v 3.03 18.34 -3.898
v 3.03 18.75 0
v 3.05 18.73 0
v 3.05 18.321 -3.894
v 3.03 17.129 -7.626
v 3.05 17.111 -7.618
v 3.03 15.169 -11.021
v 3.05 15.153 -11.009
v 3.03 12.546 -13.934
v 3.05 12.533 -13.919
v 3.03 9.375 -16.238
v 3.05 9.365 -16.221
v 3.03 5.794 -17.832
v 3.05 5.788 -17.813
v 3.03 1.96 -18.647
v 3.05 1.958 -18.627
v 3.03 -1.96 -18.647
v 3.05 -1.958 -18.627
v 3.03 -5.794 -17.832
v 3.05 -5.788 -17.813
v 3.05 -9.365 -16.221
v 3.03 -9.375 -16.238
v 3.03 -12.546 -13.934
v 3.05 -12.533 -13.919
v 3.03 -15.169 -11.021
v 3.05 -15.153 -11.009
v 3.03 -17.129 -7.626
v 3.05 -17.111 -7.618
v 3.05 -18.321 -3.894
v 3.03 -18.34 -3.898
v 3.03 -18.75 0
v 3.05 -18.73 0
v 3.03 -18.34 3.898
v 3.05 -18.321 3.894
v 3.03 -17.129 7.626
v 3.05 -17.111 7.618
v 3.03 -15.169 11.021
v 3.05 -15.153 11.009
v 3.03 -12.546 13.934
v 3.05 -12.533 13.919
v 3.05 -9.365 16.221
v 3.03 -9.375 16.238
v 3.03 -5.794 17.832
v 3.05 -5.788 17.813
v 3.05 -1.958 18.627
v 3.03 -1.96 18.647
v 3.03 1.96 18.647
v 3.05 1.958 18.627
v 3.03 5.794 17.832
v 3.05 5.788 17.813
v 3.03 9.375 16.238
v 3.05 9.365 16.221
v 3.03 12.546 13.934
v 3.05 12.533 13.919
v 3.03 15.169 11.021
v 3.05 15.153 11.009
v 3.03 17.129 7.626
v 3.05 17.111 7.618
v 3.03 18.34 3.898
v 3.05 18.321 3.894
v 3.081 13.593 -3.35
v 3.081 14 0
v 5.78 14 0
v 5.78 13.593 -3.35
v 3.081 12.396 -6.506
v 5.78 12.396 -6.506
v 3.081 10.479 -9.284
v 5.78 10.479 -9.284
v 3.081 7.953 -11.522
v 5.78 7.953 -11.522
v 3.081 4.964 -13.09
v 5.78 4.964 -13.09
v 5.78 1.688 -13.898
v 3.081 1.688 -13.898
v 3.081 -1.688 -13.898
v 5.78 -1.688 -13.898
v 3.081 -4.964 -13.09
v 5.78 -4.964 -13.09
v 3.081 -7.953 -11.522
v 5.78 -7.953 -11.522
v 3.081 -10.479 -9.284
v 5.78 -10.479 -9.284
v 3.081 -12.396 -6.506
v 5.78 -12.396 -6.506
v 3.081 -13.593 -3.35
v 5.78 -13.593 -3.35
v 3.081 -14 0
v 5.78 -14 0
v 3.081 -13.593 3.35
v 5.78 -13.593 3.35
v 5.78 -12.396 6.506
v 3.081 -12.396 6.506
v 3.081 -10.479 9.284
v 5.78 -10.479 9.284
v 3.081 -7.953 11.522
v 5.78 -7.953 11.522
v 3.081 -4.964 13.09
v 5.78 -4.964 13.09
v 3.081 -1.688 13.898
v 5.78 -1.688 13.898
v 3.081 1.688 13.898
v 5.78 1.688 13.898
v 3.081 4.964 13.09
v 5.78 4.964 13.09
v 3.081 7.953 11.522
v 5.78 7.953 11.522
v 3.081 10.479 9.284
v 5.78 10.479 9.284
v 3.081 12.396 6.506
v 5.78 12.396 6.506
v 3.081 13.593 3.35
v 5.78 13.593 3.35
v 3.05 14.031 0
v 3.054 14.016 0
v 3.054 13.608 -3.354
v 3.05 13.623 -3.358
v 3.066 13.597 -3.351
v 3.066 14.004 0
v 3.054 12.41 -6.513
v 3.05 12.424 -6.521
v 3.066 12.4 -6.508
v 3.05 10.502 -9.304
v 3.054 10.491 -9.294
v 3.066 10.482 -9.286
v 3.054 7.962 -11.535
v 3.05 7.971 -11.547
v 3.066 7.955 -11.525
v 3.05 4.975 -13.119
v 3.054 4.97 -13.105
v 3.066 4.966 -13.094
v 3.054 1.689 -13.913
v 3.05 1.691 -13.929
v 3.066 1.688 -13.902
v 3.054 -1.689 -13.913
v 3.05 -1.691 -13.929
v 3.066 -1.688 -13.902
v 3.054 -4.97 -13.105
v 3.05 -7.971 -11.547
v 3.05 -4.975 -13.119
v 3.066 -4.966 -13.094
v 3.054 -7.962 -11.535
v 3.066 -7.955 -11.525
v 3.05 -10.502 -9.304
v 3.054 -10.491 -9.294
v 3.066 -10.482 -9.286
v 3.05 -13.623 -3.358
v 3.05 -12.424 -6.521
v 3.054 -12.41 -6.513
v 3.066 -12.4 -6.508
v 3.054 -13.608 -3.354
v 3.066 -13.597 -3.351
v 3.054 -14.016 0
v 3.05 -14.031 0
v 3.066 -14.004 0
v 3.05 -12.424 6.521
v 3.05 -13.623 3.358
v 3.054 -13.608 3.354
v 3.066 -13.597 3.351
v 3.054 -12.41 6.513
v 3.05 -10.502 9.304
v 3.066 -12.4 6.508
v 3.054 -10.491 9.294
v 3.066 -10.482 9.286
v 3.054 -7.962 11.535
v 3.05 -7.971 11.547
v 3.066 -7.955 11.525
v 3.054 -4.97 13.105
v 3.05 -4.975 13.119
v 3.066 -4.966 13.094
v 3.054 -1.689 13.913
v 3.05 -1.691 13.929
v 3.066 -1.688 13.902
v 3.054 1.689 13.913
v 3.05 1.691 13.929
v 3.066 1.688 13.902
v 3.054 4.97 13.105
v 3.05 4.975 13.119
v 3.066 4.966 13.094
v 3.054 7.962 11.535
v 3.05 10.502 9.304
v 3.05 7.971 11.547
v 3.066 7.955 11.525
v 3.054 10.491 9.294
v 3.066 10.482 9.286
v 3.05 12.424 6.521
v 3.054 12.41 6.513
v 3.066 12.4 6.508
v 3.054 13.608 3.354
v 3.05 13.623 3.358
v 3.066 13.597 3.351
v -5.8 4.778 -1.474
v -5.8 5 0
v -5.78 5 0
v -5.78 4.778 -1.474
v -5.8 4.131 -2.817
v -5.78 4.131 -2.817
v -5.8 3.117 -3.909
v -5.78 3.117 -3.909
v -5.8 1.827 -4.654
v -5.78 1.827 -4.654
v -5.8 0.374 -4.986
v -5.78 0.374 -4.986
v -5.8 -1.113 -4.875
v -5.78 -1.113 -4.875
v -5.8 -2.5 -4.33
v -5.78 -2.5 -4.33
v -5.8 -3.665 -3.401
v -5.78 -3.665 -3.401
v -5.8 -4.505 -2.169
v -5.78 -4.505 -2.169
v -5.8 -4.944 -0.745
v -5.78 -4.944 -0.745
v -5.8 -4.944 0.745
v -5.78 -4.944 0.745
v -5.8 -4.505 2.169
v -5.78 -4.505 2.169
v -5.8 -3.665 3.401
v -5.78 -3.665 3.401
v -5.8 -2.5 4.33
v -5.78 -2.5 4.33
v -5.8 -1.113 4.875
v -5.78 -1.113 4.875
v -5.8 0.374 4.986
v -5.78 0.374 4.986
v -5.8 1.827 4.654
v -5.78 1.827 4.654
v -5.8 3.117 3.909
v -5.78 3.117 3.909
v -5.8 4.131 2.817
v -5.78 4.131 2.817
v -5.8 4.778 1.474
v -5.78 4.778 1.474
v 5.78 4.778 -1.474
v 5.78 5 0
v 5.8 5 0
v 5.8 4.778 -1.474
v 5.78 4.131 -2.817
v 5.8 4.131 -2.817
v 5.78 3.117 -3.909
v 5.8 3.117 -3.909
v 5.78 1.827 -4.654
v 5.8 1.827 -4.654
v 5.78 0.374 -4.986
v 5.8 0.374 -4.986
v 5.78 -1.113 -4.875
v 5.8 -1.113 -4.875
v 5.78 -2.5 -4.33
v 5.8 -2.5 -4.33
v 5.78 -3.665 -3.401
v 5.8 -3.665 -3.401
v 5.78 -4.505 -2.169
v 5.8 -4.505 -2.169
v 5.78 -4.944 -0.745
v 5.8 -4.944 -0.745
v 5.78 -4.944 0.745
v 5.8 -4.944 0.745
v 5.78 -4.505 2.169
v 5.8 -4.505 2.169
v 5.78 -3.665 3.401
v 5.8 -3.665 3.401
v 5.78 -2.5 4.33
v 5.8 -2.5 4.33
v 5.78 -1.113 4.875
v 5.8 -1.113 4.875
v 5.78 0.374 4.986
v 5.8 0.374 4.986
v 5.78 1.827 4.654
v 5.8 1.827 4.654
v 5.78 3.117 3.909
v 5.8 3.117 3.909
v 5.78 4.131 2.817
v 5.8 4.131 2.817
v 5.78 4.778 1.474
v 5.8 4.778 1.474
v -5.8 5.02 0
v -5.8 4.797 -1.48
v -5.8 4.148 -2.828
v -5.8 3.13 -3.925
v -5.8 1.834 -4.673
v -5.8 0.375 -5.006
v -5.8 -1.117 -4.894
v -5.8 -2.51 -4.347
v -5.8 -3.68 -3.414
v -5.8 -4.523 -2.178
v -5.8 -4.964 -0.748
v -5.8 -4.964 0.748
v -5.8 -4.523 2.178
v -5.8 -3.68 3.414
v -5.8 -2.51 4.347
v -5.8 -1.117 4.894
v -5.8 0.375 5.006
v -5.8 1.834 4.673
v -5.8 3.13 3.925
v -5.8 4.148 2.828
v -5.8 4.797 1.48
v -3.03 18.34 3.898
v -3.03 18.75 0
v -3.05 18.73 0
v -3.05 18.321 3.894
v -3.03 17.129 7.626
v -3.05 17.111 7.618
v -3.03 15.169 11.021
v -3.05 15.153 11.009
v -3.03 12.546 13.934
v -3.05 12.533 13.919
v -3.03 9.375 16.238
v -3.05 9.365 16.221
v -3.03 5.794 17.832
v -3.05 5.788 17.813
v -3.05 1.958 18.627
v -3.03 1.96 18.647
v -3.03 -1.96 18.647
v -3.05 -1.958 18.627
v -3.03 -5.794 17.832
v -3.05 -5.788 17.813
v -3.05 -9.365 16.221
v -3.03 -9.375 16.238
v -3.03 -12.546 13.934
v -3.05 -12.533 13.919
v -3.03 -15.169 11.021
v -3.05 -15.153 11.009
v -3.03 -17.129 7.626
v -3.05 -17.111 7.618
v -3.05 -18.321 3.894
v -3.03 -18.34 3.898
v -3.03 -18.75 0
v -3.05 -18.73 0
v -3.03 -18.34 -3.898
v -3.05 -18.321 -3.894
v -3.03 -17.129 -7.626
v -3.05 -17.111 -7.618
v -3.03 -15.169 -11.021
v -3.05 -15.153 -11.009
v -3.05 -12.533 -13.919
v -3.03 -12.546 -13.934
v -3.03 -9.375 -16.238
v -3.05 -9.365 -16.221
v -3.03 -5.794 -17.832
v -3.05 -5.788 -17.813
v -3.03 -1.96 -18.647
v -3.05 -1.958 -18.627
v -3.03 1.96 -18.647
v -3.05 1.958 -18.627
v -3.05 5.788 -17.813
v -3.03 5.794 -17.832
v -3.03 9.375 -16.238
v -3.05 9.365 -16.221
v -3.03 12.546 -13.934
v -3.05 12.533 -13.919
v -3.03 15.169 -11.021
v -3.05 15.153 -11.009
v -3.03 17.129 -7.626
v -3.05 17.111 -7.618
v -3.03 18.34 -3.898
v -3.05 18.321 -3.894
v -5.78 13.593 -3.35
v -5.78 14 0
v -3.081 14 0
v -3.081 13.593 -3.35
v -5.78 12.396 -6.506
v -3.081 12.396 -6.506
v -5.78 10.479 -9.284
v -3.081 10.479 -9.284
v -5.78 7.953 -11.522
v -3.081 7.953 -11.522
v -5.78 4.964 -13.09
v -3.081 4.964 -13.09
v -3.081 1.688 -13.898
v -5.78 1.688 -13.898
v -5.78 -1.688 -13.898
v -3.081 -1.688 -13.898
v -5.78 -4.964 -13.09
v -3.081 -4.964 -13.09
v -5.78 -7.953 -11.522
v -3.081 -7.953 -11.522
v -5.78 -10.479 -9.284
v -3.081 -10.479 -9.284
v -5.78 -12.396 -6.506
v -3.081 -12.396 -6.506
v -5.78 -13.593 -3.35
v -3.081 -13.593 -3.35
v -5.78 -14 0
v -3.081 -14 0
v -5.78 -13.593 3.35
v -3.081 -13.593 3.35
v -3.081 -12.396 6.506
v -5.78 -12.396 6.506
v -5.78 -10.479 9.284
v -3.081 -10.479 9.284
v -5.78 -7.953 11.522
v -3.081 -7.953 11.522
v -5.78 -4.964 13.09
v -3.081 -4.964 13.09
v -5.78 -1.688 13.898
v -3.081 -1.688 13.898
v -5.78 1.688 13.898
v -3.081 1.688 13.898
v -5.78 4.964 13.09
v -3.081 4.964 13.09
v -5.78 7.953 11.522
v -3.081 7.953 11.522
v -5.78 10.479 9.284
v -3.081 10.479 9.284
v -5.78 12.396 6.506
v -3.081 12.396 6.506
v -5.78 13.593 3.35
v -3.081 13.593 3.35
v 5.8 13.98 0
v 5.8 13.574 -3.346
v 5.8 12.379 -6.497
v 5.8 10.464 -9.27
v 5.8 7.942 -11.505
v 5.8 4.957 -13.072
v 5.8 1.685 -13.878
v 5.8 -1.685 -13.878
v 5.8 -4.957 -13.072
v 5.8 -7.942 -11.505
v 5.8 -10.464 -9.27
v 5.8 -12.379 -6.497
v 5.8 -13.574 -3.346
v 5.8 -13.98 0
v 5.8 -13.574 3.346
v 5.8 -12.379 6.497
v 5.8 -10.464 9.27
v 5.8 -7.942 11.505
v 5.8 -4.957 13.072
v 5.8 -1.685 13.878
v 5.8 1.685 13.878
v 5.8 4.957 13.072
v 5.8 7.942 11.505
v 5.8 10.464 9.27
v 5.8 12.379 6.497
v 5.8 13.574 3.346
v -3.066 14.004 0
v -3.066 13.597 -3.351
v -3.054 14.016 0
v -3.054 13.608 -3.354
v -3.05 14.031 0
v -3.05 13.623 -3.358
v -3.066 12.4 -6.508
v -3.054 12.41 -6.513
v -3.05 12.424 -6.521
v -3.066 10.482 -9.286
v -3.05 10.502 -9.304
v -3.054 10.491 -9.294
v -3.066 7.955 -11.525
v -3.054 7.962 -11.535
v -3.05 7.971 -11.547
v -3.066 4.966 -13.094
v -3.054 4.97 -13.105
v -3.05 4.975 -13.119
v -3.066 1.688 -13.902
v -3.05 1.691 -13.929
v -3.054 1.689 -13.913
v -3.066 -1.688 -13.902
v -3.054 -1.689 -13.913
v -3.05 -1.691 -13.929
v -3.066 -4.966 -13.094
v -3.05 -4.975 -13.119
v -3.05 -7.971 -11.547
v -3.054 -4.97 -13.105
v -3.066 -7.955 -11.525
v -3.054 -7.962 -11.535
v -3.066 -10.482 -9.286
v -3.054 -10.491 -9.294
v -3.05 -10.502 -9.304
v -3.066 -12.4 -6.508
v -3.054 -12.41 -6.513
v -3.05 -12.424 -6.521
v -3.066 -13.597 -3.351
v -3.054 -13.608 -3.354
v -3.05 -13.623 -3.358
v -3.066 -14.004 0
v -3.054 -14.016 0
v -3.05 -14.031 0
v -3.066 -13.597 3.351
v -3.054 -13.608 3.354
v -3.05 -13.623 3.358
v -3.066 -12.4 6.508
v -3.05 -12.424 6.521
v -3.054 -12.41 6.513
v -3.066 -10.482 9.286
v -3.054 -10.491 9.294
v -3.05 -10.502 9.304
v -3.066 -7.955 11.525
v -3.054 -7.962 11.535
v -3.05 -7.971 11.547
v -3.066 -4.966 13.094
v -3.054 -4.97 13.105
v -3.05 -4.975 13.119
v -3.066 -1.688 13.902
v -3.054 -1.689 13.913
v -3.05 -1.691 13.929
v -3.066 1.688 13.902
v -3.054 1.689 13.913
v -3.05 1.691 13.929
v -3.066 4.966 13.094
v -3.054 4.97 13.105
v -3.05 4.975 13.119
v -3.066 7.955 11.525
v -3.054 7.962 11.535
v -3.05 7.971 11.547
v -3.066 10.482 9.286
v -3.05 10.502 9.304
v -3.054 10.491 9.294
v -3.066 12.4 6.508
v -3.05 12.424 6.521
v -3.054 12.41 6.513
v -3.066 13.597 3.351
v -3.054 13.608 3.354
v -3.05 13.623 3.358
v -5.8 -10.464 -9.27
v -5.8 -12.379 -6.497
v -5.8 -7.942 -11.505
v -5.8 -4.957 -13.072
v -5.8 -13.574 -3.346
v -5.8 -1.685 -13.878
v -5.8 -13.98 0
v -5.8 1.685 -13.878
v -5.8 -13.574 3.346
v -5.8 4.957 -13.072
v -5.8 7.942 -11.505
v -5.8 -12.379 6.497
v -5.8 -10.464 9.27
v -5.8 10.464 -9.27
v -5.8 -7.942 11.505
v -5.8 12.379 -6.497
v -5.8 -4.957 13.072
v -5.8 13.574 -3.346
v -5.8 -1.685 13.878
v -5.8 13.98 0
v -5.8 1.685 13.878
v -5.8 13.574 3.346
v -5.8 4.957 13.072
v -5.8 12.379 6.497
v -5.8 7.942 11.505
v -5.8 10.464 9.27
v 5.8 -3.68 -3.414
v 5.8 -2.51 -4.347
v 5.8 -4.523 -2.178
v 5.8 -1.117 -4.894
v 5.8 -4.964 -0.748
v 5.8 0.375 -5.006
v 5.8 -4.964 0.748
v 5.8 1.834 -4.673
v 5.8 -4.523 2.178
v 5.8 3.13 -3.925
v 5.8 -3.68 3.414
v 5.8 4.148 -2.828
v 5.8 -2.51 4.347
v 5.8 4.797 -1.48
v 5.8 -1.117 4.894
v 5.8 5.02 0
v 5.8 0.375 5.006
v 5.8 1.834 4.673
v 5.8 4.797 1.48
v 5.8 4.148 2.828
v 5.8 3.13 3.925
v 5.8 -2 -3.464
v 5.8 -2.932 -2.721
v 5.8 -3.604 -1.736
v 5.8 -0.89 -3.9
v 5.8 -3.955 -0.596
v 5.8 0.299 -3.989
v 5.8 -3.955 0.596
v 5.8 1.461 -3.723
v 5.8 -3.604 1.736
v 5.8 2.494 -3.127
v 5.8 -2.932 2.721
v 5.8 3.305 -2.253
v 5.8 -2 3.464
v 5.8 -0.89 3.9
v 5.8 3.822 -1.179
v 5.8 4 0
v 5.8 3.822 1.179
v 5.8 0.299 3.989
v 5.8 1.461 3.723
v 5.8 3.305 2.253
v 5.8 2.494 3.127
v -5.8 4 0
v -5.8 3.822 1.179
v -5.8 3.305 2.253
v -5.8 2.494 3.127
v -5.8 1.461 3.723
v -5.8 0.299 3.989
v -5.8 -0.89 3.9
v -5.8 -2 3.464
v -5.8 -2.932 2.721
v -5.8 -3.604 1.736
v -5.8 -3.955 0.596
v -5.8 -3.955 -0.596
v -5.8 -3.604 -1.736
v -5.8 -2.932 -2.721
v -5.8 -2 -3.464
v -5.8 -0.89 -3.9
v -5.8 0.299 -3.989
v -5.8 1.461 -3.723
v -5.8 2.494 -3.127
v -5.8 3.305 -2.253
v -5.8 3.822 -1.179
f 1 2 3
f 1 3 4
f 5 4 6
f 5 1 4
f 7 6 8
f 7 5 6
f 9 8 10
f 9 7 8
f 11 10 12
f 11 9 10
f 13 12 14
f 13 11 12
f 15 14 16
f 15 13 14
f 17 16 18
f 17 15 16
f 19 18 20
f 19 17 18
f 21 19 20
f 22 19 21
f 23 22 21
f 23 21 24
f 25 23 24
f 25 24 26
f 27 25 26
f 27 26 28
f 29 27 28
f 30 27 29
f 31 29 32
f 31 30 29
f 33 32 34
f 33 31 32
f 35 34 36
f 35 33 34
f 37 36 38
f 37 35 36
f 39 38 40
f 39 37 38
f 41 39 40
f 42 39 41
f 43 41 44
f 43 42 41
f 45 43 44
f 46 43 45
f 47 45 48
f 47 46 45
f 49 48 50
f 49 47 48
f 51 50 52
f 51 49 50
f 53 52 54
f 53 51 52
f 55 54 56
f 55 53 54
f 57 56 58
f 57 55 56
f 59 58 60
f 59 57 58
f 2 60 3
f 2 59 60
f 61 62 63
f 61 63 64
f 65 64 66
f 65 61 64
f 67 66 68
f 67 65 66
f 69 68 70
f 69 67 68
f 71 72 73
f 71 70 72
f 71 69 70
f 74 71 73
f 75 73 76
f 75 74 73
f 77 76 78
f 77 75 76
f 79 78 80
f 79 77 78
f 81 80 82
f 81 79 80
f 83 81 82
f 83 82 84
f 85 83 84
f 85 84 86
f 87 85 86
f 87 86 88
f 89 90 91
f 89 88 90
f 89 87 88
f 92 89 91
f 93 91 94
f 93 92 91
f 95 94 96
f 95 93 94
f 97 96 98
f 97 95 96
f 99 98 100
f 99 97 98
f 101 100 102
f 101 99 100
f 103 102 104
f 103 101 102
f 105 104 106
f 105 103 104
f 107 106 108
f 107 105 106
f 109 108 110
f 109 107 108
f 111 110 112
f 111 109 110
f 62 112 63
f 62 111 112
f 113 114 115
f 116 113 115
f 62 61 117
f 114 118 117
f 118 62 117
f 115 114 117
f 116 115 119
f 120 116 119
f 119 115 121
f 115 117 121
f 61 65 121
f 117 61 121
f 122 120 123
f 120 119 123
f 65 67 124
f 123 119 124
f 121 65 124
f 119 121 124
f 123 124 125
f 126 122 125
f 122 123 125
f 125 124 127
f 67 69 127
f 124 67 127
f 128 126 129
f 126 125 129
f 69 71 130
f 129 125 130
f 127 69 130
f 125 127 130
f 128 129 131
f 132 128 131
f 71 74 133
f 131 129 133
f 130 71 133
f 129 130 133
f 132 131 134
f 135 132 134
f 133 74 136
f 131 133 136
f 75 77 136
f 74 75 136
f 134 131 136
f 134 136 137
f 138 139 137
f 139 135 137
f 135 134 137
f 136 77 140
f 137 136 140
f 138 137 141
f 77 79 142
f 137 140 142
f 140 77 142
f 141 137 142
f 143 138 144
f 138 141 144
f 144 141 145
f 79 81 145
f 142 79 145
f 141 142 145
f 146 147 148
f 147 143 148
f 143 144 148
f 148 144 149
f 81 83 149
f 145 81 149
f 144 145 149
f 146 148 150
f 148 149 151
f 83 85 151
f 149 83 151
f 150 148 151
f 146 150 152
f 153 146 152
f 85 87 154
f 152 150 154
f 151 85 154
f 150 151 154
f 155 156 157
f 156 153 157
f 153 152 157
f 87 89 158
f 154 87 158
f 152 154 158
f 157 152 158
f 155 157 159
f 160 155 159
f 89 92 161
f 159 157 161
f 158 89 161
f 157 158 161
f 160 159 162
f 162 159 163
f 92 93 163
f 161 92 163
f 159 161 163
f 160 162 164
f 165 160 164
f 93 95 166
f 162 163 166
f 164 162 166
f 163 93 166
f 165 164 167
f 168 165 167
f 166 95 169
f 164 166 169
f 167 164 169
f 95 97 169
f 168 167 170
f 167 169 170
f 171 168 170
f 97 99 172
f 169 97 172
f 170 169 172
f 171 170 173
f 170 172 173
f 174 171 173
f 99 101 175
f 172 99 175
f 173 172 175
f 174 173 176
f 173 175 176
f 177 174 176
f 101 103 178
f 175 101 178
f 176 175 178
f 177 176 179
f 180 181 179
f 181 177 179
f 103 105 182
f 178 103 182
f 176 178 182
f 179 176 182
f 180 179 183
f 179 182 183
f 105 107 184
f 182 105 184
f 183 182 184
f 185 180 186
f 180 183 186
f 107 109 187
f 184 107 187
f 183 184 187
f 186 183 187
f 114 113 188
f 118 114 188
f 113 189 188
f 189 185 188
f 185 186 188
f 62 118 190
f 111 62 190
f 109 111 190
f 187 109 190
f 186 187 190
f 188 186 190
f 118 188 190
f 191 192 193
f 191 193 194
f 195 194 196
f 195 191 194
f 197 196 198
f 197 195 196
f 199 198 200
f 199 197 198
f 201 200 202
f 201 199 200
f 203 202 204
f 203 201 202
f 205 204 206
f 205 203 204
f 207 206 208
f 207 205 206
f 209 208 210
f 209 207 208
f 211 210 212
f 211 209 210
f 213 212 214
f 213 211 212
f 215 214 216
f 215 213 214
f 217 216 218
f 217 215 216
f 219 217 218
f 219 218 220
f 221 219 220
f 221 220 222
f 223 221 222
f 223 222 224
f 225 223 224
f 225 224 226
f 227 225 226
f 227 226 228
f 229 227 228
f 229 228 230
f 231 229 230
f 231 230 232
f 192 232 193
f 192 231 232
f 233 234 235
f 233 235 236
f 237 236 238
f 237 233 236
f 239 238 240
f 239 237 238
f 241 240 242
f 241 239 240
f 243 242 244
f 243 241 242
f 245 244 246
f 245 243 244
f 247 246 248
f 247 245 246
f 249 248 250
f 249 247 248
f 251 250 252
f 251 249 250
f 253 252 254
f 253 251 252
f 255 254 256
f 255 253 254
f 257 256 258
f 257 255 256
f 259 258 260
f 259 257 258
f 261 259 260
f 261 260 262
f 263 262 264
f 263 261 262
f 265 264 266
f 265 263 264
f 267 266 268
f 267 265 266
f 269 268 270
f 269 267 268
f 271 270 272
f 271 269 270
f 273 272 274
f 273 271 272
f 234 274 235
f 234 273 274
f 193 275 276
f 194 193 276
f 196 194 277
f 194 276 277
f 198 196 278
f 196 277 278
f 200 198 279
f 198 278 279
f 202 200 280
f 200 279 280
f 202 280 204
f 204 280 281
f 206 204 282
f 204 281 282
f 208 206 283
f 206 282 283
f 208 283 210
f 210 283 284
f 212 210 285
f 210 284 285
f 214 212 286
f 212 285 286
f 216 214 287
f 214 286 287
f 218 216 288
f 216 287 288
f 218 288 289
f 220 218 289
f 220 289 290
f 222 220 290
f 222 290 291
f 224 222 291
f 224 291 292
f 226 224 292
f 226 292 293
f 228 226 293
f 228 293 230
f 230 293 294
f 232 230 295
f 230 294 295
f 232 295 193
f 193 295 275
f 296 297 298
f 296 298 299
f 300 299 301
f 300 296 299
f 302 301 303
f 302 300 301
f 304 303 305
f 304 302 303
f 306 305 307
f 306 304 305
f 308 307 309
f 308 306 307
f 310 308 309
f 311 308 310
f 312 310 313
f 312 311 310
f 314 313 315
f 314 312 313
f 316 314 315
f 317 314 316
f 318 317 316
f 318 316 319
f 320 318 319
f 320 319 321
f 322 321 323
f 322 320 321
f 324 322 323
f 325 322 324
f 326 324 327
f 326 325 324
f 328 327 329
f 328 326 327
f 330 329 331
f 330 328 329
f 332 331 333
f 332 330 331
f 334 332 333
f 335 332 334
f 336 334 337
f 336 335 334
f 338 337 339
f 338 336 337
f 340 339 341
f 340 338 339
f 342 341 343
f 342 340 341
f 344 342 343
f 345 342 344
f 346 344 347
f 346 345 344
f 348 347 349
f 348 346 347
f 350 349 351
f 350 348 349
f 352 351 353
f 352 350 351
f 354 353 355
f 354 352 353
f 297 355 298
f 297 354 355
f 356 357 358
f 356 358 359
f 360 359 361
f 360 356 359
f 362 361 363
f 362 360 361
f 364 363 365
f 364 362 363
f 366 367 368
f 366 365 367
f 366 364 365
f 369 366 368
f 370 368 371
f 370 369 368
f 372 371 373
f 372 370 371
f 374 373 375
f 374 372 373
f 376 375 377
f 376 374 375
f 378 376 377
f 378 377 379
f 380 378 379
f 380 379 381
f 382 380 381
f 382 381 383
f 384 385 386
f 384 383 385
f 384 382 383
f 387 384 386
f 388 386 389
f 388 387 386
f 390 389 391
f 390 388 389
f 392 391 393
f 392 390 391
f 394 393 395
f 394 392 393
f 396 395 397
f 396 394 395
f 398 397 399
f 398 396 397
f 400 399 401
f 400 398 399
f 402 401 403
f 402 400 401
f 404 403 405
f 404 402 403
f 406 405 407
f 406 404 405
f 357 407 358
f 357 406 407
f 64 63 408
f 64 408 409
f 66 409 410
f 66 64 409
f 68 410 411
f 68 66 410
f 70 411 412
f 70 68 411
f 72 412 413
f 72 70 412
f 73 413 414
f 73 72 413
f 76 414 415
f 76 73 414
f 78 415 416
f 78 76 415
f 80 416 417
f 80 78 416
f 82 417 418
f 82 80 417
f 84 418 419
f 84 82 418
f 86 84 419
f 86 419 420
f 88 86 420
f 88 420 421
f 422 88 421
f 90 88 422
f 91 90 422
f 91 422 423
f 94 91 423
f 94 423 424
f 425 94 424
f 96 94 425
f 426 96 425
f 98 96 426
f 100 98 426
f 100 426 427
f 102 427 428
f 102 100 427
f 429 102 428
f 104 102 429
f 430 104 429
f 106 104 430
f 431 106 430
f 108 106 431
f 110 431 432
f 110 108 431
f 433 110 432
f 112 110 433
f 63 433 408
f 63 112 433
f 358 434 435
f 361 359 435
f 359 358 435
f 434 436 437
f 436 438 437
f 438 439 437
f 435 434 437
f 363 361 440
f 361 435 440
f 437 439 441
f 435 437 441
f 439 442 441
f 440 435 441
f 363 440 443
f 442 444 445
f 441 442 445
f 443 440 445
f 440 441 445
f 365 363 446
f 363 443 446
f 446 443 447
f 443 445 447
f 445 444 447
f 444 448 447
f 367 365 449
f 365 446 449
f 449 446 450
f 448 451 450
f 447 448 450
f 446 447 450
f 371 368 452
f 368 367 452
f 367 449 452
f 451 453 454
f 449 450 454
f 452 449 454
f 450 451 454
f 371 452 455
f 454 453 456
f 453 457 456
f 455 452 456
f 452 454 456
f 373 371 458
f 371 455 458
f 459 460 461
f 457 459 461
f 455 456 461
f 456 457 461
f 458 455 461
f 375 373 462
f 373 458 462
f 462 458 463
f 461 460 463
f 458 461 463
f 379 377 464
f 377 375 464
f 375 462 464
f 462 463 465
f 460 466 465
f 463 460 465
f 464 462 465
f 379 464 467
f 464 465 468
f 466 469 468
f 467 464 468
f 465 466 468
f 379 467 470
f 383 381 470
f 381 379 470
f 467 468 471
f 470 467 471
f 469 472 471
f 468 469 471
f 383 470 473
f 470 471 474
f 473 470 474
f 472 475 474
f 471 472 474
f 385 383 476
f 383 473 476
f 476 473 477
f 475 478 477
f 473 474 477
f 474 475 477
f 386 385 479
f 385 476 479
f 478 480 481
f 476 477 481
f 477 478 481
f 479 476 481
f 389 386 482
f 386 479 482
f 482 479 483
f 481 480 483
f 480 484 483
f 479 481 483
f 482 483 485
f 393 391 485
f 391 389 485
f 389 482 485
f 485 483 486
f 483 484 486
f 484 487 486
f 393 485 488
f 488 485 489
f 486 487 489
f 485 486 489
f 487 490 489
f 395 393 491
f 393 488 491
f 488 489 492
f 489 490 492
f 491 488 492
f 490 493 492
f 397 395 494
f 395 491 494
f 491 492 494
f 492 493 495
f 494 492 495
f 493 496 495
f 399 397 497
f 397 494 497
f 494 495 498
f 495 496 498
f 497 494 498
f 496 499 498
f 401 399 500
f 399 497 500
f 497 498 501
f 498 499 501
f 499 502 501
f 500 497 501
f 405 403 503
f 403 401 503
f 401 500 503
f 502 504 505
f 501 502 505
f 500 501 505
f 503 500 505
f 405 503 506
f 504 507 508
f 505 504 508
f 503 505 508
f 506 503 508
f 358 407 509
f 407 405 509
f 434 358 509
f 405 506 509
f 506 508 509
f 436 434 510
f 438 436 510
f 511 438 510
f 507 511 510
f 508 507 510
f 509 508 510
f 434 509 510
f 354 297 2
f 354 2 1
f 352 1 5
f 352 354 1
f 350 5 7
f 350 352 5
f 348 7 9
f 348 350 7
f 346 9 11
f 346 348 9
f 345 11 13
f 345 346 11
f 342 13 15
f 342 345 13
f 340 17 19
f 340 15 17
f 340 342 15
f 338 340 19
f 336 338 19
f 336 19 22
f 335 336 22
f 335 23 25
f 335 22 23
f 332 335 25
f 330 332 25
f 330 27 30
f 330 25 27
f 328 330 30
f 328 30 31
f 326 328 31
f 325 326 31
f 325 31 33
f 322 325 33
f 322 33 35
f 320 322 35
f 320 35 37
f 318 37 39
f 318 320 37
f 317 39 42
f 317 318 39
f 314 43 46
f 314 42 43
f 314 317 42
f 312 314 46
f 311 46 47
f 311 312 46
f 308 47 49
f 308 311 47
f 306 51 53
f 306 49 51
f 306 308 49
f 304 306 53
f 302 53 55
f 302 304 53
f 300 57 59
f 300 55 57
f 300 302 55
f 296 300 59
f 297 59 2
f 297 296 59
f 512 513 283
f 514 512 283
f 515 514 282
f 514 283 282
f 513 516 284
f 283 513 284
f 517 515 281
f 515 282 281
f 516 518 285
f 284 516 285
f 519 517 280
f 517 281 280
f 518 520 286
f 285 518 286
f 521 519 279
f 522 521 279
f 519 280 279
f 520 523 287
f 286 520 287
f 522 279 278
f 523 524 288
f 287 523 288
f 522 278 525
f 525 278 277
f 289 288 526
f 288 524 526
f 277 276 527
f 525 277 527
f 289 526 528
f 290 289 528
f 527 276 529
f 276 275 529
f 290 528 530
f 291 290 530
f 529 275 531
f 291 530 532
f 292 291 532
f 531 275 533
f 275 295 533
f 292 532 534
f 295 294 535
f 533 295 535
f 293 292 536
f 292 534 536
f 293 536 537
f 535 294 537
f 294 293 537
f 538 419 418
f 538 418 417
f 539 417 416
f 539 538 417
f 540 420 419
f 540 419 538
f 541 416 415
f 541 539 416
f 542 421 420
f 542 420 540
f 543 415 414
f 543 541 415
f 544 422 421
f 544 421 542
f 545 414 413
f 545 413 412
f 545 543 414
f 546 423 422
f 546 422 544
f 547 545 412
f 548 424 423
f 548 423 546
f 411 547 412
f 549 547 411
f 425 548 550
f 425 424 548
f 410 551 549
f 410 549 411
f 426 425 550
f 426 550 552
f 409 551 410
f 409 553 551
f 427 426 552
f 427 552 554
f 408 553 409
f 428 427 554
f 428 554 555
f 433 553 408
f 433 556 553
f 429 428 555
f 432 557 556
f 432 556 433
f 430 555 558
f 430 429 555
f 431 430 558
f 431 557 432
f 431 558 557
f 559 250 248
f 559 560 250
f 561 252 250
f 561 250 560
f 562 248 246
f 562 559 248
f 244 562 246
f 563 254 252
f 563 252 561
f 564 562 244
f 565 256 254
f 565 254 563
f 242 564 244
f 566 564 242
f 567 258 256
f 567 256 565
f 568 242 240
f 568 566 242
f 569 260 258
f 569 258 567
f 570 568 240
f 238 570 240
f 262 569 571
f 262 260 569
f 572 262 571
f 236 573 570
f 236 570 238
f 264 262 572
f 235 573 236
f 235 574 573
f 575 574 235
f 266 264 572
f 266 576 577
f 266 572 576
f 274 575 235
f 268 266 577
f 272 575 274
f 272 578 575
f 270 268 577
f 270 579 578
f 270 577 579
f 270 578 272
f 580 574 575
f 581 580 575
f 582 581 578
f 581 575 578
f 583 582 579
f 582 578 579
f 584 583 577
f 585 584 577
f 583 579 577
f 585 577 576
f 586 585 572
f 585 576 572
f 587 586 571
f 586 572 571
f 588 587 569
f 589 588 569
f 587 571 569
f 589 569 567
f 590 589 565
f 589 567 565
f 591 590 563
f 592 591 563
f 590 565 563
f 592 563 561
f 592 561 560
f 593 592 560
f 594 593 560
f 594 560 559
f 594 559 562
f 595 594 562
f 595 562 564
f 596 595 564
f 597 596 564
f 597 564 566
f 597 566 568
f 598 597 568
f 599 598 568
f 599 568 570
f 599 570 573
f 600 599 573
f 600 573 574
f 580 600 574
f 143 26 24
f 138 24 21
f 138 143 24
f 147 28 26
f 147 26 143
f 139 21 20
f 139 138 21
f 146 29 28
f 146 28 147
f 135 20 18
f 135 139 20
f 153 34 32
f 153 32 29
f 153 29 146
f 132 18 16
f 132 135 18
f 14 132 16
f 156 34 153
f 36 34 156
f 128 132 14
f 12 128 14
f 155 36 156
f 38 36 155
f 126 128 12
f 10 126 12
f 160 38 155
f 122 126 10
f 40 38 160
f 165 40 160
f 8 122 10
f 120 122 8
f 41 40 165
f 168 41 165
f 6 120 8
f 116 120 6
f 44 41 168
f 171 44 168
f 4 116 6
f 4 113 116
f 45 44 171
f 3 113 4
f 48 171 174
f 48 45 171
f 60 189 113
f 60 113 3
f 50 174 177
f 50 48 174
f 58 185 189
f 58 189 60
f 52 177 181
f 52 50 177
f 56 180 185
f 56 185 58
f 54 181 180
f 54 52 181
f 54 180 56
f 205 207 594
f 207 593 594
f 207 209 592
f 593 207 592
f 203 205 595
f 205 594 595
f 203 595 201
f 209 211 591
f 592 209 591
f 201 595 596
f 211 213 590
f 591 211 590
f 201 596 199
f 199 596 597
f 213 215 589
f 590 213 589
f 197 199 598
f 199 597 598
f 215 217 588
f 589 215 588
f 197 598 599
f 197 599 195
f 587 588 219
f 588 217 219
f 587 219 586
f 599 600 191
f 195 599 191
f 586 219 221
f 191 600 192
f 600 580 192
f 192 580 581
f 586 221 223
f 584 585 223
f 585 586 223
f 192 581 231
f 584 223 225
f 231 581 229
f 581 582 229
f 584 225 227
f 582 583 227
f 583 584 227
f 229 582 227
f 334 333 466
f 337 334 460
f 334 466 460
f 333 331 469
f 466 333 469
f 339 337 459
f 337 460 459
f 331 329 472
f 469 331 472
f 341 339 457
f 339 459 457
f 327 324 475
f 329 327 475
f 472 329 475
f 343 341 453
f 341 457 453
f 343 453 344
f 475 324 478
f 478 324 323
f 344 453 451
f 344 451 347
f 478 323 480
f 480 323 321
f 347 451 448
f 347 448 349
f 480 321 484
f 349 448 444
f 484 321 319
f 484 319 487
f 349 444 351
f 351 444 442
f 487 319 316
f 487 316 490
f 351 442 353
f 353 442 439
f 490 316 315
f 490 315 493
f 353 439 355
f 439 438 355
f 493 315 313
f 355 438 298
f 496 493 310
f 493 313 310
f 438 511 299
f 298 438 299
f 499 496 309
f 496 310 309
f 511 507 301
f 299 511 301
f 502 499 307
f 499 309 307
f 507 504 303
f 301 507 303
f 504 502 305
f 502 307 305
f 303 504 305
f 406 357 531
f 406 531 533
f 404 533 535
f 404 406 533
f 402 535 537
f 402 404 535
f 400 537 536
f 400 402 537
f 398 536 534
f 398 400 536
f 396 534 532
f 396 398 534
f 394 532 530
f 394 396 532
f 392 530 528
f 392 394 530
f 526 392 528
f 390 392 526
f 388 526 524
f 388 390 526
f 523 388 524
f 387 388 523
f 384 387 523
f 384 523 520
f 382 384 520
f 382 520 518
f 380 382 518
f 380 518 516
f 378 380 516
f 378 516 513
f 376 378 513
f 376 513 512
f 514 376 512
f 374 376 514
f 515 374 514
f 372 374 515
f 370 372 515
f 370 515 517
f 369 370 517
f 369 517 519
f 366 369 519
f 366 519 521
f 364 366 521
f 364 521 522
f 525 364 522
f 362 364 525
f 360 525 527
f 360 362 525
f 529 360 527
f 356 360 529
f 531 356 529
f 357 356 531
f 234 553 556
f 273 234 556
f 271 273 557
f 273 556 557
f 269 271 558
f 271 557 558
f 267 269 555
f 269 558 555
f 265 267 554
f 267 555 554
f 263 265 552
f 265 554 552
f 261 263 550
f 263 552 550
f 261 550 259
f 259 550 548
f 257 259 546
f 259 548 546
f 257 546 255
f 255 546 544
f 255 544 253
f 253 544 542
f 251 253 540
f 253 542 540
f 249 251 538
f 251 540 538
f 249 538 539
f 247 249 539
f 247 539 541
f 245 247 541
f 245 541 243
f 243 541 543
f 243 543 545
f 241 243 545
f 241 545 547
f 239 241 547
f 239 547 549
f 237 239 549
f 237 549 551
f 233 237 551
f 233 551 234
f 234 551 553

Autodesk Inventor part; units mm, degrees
sketch "Sketch_1" plane through (0, 0, 0) normal (0, 0, 1) x (1, 0, 0)
  line L0 (5.8, 0) -> (-5.8, 0)
  line L1 (-5.8, 5.02) -> (-5.78, 5)
  line L2 (-5.78, 5) -> (5.78, 5)
  line L3 (5.78, 5) -> (5.8, 5.02)
  line L4 (5.8, 5.02) -> (5.8, 13.98)
  line L5 (5.8, 13.98) -> (5.78, 14)
  line L6 (5.78, 14) -> (3.081, 14)
  arc A0 (3.05, 14.031) -> (3.081, 14) centre (3.081, 14.031) ccw
  line L7 (3.05, 14.031) -> (3.05, 18.73)
  line L8 (3.05, 18.73) -> (3.03, 18.75)
  line L9 (3.03, 18.75) -> (-3.03, 18.75)
  line L10 (-3.03, 18.75) -> (-3.05, 18.73)
  line L11 (-3.05, 18.73) -> (-3.05, 14.031)
  arc A1 (-3.081, 14) -> (-3.05, 14.031) centre (-3.081, 14.031) ccw
  line L12 (-3.081, 14) -> (-5.78, 14)
  line L13 (-5.78, 14) -> (-5.8, 13.98)
  line L14 (-5.8, 13.98) -> (-5.8, 5.02)
revolve "Revolution1" add sketch "Sketch_1" angle 360 about axis through (5.8, 0, 0) along (1, 0, 0)
sketch "Sketch_2" plane through (0, 0, 0) normal (0, 0, 1) x (1, 0, 0)
  line L0 (5.8, 0) -> (-5.8, 0)
  line L1 (-5.8, 5) -> (-5.8, 4)
  line L2 (-5.8, 4) -> (5.8, 4)
  line L3 (5.8, 4) -> (5.8, 5)
  line L4 (5.8, 5) -> (-5.8, 5)
revolve "Revolution2" add sketch "Sketch_2" angle 360 about axis through (5.8, 0, 0) along (1, 0, 0)
ref_plane "to_bolt_XY" through (5.8, 0, 0) normal (1, 0, 0) x (0, 0, -1)
ref_plane "to_bolt_YZ" through (5.8, 0, 0) normal (0, 0, -1) x (0, 1, 0)
ref_plane "to_bolt_ZX" through (5.8, 0, 0) normal (0, 1, 0) x (1, 0, 0)
ref_plane "wheel_XY" through (0, 0, 0) normal (1, 0, 0) x (0, 0, -1)
ref_plane "wheel_YZ" through (0, 0, 0) normal (0, 0, -1) x (0, 1, 0)
ref_plane "wheel_ZX" through (0, 0, 0) normal (0, 1, 0) x (1, 0, 0)
properties part number "25-2281_w"
